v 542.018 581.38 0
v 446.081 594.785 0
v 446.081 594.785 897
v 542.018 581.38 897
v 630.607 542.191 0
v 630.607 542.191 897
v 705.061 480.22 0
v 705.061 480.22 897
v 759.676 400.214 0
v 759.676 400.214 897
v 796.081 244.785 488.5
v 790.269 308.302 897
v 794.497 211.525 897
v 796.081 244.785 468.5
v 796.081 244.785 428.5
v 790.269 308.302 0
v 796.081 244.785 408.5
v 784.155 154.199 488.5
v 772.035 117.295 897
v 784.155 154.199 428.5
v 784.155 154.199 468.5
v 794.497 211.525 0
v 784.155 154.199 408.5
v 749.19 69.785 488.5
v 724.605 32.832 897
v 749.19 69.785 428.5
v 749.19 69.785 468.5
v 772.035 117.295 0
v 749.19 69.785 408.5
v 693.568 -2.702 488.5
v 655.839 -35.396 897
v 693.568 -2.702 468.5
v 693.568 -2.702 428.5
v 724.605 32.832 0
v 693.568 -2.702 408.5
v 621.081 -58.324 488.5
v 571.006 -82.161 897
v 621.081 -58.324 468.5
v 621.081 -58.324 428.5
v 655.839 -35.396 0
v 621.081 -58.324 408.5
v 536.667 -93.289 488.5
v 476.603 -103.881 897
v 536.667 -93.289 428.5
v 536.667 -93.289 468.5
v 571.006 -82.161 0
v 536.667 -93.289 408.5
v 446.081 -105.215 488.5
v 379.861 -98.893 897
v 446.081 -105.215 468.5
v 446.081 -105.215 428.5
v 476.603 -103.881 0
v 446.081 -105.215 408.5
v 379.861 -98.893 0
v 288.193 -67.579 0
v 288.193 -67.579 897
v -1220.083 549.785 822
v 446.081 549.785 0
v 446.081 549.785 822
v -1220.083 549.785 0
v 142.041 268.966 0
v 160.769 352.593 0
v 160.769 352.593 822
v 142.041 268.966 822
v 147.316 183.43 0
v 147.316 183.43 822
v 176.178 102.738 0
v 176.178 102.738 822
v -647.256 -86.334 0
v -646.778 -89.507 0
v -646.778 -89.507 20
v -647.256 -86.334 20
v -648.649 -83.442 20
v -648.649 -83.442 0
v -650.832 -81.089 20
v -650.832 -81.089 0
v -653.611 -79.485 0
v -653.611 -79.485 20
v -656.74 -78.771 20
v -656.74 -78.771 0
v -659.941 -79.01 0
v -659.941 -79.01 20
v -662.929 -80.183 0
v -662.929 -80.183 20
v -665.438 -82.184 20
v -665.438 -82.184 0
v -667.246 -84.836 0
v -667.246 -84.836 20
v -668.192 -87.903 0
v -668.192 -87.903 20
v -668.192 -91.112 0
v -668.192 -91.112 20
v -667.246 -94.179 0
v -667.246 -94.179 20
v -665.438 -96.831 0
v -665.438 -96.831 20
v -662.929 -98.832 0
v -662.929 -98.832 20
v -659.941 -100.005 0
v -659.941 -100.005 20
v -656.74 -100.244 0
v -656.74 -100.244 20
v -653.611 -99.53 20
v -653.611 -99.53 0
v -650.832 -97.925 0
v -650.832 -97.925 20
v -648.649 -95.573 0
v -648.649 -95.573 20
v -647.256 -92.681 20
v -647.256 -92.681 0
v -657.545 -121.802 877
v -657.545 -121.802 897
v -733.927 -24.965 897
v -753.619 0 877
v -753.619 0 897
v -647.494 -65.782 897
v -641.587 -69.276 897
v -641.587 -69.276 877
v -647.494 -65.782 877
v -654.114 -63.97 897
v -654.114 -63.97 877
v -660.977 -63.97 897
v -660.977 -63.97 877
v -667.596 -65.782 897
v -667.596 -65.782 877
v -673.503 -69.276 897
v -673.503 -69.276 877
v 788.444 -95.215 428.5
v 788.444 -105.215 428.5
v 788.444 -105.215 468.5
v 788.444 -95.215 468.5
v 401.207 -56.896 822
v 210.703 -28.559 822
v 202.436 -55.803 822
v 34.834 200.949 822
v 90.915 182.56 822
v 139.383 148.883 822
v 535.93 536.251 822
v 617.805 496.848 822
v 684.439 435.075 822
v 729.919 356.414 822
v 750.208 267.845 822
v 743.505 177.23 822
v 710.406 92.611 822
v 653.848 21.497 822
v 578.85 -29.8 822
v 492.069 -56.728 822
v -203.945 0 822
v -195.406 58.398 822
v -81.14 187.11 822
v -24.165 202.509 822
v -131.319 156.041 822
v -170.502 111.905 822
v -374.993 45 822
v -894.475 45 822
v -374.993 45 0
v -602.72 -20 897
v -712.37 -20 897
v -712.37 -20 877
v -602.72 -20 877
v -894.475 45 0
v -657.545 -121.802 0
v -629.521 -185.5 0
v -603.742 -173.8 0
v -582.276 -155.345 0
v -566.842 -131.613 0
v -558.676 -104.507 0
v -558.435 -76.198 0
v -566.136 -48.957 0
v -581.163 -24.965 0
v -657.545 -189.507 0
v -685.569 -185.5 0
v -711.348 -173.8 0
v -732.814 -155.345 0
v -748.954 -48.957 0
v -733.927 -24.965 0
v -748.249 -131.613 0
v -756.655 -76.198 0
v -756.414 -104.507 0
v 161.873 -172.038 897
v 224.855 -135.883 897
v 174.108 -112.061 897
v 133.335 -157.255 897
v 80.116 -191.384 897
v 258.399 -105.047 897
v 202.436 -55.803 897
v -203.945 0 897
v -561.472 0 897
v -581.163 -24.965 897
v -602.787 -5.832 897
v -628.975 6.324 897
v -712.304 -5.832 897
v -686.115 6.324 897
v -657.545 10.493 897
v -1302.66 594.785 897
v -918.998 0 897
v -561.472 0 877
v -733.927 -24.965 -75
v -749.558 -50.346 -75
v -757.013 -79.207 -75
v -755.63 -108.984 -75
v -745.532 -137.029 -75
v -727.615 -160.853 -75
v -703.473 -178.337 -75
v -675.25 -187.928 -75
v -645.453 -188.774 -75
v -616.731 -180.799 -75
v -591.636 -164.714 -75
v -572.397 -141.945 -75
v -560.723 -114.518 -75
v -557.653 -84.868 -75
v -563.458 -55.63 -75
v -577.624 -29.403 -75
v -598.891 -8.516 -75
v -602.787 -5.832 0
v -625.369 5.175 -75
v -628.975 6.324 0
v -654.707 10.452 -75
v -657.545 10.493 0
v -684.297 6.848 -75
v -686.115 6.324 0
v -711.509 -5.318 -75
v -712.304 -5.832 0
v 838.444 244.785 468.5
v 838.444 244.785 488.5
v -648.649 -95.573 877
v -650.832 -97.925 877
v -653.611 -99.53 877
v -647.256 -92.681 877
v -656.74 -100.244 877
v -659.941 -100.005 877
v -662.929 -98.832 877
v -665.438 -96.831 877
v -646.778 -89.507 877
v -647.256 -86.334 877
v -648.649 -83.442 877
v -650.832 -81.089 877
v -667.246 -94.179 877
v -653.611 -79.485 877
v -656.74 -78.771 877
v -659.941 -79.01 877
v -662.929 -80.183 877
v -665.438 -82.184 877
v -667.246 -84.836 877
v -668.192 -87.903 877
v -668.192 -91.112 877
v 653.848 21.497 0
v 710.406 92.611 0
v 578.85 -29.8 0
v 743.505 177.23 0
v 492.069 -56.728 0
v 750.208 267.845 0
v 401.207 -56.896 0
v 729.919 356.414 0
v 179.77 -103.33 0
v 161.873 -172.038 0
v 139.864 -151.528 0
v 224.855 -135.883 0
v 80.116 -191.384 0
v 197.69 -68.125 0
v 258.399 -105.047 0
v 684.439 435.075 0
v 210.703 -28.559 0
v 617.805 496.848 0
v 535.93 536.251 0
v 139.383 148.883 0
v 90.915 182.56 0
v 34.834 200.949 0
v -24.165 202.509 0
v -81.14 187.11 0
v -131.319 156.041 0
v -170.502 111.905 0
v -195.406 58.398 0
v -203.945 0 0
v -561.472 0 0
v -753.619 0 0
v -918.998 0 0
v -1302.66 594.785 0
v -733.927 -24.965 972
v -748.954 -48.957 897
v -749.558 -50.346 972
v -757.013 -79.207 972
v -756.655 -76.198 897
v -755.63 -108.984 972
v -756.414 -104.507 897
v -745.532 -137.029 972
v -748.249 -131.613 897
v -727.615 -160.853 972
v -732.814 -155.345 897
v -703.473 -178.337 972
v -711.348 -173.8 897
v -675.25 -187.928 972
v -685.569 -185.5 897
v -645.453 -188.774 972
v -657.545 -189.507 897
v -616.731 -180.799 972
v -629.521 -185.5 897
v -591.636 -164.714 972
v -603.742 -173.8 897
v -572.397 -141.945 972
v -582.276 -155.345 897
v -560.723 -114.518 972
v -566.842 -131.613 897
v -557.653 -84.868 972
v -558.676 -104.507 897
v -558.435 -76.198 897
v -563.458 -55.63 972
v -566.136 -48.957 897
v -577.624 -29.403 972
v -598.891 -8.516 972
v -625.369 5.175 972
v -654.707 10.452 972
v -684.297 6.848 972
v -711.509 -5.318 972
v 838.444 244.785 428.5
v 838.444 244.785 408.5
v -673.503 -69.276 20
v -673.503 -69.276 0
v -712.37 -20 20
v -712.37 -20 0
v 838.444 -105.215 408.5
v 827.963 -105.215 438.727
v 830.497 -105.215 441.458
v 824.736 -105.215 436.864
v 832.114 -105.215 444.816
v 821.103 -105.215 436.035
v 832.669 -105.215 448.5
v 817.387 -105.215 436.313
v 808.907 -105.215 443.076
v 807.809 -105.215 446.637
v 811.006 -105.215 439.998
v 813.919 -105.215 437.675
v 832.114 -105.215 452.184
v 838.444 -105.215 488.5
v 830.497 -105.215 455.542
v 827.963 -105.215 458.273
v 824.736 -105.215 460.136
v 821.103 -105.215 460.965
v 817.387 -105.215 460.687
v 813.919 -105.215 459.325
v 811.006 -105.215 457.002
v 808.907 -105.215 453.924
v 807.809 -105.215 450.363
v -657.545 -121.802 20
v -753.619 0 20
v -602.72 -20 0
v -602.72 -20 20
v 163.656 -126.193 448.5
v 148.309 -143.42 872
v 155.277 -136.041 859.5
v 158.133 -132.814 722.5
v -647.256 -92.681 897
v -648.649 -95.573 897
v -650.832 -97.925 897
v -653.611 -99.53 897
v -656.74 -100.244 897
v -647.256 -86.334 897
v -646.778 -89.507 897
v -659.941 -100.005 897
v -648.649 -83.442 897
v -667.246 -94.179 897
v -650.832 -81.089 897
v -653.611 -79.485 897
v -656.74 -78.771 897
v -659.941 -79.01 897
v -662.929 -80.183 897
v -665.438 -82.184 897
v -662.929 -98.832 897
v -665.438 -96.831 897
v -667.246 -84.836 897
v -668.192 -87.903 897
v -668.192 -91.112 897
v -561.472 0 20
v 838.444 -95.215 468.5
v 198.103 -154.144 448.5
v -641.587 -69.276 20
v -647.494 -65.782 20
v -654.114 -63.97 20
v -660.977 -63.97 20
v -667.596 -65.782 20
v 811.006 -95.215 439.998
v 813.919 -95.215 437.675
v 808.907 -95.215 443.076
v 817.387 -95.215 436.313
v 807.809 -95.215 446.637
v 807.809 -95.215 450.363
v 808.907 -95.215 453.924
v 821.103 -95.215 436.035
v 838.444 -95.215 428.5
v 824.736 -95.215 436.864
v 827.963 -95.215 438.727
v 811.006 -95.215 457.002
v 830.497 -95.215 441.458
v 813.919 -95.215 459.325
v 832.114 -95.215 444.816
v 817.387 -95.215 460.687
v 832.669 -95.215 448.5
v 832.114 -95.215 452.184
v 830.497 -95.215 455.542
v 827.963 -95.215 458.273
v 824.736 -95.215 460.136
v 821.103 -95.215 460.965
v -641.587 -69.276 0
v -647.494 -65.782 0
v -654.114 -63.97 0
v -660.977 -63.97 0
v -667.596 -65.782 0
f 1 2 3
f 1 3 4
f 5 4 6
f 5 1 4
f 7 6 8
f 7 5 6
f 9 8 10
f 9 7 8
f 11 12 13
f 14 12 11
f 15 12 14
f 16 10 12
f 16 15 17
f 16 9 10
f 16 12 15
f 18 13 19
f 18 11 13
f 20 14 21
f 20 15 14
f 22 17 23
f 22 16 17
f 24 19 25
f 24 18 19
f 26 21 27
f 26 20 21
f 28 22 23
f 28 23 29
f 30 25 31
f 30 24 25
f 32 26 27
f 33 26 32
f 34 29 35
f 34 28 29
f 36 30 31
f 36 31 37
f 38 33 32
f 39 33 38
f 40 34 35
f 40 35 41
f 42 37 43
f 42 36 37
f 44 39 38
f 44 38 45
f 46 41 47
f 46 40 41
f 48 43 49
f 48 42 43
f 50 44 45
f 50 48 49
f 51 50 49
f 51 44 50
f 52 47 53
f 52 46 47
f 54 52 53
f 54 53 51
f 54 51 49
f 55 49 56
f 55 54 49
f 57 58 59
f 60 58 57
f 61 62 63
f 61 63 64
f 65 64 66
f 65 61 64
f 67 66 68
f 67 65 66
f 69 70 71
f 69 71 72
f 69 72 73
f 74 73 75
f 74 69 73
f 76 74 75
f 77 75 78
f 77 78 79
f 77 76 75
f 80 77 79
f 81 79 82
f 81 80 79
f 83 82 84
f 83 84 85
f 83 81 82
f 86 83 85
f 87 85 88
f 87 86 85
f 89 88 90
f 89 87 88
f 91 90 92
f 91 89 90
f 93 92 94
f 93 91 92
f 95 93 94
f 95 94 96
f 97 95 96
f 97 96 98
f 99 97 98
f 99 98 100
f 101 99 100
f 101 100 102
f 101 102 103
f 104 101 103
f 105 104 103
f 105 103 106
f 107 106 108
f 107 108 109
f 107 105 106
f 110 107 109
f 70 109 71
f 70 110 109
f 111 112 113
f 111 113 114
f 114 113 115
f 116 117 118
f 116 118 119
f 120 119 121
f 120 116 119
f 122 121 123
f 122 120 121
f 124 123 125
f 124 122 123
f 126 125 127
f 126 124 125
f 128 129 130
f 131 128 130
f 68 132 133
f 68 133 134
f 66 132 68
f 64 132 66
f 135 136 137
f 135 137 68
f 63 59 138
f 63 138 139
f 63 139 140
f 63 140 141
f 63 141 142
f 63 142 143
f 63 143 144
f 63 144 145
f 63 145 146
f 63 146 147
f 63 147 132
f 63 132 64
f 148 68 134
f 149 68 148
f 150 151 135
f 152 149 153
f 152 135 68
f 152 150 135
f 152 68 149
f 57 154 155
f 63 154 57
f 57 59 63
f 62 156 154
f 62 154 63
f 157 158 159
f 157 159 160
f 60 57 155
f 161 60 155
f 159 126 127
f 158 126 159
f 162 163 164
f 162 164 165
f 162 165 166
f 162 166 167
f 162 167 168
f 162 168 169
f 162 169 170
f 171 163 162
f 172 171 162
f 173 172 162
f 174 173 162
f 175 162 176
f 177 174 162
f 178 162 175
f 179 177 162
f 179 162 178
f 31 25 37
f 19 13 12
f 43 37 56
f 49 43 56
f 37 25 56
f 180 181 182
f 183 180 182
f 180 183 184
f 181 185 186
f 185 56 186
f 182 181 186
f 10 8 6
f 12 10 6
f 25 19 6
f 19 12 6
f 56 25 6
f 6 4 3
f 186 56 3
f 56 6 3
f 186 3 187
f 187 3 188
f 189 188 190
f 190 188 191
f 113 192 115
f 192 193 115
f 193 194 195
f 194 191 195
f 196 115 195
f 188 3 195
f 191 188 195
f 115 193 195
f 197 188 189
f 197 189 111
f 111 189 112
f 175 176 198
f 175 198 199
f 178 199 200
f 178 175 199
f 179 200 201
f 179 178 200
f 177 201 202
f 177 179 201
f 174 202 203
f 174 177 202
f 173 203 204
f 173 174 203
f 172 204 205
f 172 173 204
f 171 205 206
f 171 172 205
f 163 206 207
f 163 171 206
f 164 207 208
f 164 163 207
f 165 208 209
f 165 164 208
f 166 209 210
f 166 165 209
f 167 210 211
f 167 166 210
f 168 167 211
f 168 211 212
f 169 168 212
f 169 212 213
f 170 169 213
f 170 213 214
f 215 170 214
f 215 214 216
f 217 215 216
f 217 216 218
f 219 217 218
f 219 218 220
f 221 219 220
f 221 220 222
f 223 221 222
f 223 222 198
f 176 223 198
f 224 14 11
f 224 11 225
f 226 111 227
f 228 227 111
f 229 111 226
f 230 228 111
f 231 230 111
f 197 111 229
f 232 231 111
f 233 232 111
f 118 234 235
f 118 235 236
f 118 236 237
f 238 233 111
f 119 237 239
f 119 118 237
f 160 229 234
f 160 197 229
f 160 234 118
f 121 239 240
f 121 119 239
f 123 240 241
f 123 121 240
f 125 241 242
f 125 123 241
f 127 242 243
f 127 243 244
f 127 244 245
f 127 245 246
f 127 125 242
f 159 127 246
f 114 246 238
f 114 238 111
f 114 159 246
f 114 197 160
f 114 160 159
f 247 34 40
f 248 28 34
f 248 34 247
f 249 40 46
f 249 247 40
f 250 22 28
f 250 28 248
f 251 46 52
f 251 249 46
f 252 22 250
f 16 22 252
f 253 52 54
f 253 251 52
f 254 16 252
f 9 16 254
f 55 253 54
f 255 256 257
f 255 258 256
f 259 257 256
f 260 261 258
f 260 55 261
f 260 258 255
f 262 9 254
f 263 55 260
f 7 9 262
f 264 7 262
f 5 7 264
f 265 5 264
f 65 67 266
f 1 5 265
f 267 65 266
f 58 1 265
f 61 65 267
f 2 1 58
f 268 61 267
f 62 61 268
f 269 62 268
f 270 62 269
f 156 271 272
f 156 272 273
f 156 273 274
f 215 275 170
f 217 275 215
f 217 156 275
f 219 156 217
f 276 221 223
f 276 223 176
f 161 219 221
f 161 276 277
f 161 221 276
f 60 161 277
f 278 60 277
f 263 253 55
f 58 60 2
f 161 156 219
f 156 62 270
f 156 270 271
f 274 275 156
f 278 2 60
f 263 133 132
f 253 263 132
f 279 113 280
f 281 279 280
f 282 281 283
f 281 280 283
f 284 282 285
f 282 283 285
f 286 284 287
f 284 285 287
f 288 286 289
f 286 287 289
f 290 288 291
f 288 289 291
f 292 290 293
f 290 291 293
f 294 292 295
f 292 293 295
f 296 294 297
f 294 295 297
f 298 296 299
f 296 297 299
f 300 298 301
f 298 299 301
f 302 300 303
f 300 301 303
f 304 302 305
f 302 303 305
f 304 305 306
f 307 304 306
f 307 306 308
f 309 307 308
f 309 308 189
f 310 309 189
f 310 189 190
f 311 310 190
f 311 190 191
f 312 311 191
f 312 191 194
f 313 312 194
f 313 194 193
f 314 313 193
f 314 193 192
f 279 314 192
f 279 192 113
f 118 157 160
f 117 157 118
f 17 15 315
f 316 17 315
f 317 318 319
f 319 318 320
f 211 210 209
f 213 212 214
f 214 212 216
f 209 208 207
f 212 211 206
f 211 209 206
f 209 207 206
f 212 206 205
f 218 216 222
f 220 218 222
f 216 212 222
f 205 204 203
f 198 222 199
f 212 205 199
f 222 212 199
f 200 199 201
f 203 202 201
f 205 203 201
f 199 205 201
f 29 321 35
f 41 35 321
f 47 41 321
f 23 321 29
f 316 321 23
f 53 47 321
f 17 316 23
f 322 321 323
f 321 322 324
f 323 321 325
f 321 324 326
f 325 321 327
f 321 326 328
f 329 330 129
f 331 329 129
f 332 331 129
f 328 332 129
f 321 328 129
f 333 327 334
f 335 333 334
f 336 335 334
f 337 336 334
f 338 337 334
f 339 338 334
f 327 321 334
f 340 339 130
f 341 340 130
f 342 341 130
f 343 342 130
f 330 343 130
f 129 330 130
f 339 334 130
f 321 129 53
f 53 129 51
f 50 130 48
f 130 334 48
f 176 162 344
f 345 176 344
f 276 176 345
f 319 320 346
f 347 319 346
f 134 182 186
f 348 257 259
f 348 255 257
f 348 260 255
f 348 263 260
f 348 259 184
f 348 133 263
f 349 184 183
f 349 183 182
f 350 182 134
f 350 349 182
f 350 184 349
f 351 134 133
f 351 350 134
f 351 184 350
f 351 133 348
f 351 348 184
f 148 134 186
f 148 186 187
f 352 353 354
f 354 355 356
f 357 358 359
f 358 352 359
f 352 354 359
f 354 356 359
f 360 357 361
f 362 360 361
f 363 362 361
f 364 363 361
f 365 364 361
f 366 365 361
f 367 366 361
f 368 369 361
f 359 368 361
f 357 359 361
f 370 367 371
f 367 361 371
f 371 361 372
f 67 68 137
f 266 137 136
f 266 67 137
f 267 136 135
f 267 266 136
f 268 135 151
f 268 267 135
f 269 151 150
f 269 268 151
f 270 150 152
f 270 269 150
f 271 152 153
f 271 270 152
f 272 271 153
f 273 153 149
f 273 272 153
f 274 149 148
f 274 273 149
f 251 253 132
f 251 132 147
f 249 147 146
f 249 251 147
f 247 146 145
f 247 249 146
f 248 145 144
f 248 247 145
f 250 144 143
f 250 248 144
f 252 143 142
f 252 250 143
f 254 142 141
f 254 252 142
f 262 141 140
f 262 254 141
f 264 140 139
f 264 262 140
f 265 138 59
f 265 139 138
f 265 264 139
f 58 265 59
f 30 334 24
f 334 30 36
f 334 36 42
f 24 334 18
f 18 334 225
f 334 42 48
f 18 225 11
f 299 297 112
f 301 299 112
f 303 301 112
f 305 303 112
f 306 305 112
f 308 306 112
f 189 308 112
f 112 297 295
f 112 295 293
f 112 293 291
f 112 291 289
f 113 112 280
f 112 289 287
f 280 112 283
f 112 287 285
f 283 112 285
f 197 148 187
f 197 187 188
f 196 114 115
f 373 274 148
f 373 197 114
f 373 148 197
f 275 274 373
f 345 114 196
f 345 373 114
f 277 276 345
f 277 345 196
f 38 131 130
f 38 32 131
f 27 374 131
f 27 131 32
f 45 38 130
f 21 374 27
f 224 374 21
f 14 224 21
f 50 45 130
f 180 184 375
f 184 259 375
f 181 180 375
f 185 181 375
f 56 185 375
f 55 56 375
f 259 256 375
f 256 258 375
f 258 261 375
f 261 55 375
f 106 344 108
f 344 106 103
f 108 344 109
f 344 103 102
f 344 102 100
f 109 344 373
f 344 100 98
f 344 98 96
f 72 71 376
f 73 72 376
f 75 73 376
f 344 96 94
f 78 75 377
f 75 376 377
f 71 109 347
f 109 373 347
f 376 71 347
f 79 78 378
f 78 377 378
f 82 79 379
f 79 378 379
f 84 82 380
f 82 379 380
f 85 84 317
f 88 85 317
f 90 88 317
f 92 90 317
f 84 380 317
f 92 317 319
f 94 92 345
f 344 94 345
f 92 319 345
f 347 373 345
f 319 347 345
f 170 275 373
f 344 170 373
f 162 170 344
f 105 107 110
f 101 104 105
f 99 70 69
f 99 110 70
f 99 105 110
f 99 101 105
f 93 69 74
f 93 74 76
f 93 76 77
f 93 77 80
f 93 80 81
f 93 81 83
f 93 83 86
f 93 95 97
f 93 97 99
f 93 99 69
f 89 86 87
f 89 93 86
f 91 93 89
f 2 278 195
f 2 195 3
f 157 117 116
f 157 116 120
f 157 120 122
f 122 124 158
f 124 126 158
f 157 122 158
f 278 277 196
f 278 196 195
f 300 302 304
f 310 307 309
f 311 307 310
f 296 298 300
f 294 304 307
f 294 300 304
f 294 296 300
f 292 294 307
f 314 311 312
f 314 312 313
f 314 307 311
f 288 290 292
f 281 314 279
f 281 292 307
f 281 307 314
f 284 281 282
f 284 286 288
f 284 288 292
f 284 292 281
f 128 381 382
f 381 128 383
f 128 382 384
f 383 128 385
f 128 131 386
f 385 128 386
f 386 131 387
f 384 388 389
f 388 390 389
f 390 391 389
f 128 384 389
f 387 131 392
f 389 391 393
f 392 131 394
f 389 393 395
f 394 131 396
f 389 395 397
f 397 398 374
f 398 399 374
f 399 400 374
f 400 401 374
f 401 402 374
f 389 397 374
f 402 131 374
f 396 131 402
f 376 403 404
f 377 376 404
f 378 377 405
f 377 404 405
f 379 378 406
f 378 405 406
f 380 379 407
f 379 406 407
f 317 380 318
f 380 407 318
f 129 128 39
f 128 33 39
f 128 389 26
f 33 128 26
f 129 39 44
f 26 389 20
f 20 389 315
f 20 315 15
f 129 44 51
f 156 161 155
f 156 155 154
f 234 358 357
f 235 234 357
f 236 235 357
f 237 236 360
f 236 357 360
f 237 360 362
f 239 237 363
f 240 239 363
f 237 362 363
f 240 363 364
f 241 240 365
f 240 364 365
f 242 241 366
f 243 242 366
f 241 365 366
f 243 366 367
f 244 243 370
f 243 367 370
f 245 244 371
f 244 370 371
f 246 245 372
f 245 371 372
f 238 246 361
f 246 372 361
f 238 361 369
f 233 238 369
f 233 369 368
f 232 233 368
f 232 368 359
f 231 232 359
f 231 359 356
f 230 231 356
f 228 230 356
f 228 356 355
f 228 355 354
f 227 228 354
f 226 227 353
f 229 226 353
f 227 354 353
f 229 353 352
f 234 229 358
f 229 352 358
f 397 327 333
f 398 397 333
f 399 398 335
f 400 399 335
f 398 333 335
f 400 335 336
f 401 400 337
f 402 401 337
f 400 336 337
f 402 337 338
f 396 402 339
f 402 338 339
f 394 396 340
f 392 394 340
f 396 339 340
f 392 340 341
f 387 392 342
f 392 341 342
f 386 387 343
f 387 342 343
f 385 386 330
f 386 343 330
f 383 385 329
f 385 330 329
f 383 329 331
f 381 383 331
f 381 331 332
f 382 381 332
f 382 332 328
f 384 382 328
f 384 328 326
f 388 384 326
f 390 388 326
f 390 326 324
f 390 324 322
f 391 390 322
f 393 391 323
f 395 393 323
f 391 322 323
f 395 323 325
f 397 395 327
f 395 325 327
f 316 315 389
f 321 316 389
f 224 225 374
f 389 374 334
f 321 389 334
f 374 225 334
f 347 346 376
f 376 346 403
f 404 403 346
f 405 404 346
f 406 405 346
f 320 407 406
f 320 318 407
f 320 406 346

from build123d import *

# Parameters (mm, degrees)
BOSS_EXTRUDE1_DEPTH = 897
SKETCH2_R           = 10.767041916
BOSS_EXTRUDE2_DEPTH = 20
BOSS_EXTRUDE3_START = 20
BOSS_EXTRUDE3_DEPTH = 20
SKETCH4_W           = 50
SKETCH4_H           = 50
SKETCH4_R           = 12.5
BOSS_EXTRUDE4_DEPTH = 10
SKETCH5_R           = 100
BOSS_EXTRUDE5_DEPTH = 75
BOSS_EXTRUDE6_START = -75
BOSS_EXTRUDE6_DEPTH = 75


with BuildPart() as part:
    # Sketch1 → Boss-Extrude1 (new body)
    with BuildSketch(Plane.XY):
        with BuildLine():
            add(Edge.make_bspline(
                [(80.115553735, -191.384207833), (181.903017437, -142.41499007), (210.702960853, -28.558773965)],
                knots=[0, 0, 0, 1, 1, 1], degree=2))
            Line((210.702960853, -28.558773965), (401.206683232, -56.895630445))
            ThreePointArc((401.206683232, -56.895630445), (750.24986995, 222.286833017), (446.080798211, 549.785184001))
            Line((446.080798211, 549.785184001), (-1220.08310634, 549.785184001))
            Line((-1220.08310634, 549.785184001), (-894.475187417, 45))
            Line((-894.475187417, 45), (-374.993230006, 45))
            Line((-374.993230006, 45), (160.769466444, 352.592623287))
            ThreePointArc((160.769466444, 352.592623287), (141.659115875, 226.01181659), (176.177724746, 102.738251846))
            ThreePointArc((176.177724746, 102.738251846), (-53.212296367, 196.881158582), (-203.945431646, 0))
            Line((-203.945431646, 0), (-918.997892597, 0))
            Line((-918.997892597, 0), (-1302.659640419, 594.785184001))
            Line((-1302.659640419, 594.785184001), (446.080798211, 594.785184001))
            ThreePointArc((446.080798211, 594.785184001), (786.541848074, 163.629324532), (288.192746113, -67.578967279))
            add(Edge.make_bspline(
                [(80.115553735, -191.384207833), (212.051449387, -178.806537551), (288.192746113, -67.578967279)],
                knots=[0, 0, 0, 1, 1, 1], degree=2))
        make_face()
    extrude(amount=BOSS_EXTRUDE1_DEPTH)

    # Sketch2 → Boss-Extrude2 (add)
    with BuildSketch(Plane.XY.offset(897)):
        Polygon((-753.618518266, 0), (-561.471662121, 0), (-657.545090194, -121.801839924), align=None)
        with Locations((-657.545090194, -89.507472225)):
            Circle(SKETCH2_R, mode=Mode.SUBTRACT)
        with BuildLine():
            Line((-712.370379676, -20), (-602.719800711, -20))
            Line((-602.719800711, -20), (-641.587482876, -69.276426335))
            ThreePointArc((-641.587482876, -69.276426335), (-657.545090194, -63.740430309), (-673.502697511, -69.276426335))
            Line((-673.502697511, -69.276426335), (-712.370379676, -20))
        make_face(mode=Mode.SUBTRACT)
    boss_extrude2 = extrude(amount=-BOSS_EXTRUDE2_DEPTH)

    # Mirror1: Boss-Extrude2 across plane
    add(boss_extrude2.mirror(Plane.XY.offset(448.5)))

    # Sketch3 → Boss-Extrude3 (add)
    with BuildSketch(Plane.XY.offset(448.5).offset(BOSS_EXTRUDE3_START)):
        with BuildLine():
            Line((796.080798211, -105.214815999), (446.080798211, -105.214815999))
            ThreePointArc((446.080798211, -105.214815999), (693.568171626, -2.702189415), (796.080798211, 244.785184001))
            Line((796.080798211, 244.785184001), (838.444150781, 244.785184001))
            Line((838.444150781, 244.785184001), (838.444150781, -105.214815999))
            Line((838.444150781, -105.214815999), (796.080798211, -105.214815999))
        make_face()
    extrude(amount=BOSS_EXTRUDE3_DEPTH)

    # Mirror2: part across plane


with BuildPart() as part_1:
    add(part.part)
    add(part.part.mirror(Plane.XY.offset(448.5)))

    # Sketch4 → Boss-Extrude4 (add)
    with BuildSketch(Plane.XZ.offset(105.214815999)):
        with Locations((813.444150781, 448.5)):
            Rectangle(SKETCH4_W, SKETCH4_H)
        with Locations((820.168886717, 448.5)):
            Circle(SKETCH4_R, mode=Mode.SUBTRACT)
    extrude(amount=-BOSS_EXTRUDE4_DEPTH)

    # Sketch5 → Boss-Extrude5 (add)
    with BuildSketch(Plane.XY.offset(897)):
        with Locations(Location((-657.545090194, -89.507472225, 0), (0, 0, 139.802215435))):
            Circle(SKETCH5_R)
    extrude(amount=BOSS_EXTRUDE5_DEPTH)

    # Mirror3: part across plane


with BuildPart() as part_2:
    add(part_1.part)
    add(part_1.part.mirror(Plane.XY.offset(448.5)))

    # Sketch6 → Boss-Extrude6 (add)
    with BuildSketch(Plane.XY.offset(897).offset(BOSS_EXTRUDE6_START)):
        with BuildLine():
            Line((-203.945431646, 0), (-561.471662121, 0))
            Line((-561.471662121, 0), (-753.618518266, 0))
            Line((-753.618518266, 0), (-918.997892597, 0))
            Line((-918.997892597, 0), (-1302.659640419, 594.785184001))
            Line((-1302.659640419, 594.785184001), (446.080798211, 594.785184001))
            ThreePointArc((446.080798211, 594.785184001), (786.541848074, 163.629324532), (288.192746113, -67.578967279))
            Line((288.192746113, -67.578967279), (-203.945431646, 0))
        make_face()
    extrude(amount=BOSS_EXTRUDE6_DEPTH)


solid = part_2.part
